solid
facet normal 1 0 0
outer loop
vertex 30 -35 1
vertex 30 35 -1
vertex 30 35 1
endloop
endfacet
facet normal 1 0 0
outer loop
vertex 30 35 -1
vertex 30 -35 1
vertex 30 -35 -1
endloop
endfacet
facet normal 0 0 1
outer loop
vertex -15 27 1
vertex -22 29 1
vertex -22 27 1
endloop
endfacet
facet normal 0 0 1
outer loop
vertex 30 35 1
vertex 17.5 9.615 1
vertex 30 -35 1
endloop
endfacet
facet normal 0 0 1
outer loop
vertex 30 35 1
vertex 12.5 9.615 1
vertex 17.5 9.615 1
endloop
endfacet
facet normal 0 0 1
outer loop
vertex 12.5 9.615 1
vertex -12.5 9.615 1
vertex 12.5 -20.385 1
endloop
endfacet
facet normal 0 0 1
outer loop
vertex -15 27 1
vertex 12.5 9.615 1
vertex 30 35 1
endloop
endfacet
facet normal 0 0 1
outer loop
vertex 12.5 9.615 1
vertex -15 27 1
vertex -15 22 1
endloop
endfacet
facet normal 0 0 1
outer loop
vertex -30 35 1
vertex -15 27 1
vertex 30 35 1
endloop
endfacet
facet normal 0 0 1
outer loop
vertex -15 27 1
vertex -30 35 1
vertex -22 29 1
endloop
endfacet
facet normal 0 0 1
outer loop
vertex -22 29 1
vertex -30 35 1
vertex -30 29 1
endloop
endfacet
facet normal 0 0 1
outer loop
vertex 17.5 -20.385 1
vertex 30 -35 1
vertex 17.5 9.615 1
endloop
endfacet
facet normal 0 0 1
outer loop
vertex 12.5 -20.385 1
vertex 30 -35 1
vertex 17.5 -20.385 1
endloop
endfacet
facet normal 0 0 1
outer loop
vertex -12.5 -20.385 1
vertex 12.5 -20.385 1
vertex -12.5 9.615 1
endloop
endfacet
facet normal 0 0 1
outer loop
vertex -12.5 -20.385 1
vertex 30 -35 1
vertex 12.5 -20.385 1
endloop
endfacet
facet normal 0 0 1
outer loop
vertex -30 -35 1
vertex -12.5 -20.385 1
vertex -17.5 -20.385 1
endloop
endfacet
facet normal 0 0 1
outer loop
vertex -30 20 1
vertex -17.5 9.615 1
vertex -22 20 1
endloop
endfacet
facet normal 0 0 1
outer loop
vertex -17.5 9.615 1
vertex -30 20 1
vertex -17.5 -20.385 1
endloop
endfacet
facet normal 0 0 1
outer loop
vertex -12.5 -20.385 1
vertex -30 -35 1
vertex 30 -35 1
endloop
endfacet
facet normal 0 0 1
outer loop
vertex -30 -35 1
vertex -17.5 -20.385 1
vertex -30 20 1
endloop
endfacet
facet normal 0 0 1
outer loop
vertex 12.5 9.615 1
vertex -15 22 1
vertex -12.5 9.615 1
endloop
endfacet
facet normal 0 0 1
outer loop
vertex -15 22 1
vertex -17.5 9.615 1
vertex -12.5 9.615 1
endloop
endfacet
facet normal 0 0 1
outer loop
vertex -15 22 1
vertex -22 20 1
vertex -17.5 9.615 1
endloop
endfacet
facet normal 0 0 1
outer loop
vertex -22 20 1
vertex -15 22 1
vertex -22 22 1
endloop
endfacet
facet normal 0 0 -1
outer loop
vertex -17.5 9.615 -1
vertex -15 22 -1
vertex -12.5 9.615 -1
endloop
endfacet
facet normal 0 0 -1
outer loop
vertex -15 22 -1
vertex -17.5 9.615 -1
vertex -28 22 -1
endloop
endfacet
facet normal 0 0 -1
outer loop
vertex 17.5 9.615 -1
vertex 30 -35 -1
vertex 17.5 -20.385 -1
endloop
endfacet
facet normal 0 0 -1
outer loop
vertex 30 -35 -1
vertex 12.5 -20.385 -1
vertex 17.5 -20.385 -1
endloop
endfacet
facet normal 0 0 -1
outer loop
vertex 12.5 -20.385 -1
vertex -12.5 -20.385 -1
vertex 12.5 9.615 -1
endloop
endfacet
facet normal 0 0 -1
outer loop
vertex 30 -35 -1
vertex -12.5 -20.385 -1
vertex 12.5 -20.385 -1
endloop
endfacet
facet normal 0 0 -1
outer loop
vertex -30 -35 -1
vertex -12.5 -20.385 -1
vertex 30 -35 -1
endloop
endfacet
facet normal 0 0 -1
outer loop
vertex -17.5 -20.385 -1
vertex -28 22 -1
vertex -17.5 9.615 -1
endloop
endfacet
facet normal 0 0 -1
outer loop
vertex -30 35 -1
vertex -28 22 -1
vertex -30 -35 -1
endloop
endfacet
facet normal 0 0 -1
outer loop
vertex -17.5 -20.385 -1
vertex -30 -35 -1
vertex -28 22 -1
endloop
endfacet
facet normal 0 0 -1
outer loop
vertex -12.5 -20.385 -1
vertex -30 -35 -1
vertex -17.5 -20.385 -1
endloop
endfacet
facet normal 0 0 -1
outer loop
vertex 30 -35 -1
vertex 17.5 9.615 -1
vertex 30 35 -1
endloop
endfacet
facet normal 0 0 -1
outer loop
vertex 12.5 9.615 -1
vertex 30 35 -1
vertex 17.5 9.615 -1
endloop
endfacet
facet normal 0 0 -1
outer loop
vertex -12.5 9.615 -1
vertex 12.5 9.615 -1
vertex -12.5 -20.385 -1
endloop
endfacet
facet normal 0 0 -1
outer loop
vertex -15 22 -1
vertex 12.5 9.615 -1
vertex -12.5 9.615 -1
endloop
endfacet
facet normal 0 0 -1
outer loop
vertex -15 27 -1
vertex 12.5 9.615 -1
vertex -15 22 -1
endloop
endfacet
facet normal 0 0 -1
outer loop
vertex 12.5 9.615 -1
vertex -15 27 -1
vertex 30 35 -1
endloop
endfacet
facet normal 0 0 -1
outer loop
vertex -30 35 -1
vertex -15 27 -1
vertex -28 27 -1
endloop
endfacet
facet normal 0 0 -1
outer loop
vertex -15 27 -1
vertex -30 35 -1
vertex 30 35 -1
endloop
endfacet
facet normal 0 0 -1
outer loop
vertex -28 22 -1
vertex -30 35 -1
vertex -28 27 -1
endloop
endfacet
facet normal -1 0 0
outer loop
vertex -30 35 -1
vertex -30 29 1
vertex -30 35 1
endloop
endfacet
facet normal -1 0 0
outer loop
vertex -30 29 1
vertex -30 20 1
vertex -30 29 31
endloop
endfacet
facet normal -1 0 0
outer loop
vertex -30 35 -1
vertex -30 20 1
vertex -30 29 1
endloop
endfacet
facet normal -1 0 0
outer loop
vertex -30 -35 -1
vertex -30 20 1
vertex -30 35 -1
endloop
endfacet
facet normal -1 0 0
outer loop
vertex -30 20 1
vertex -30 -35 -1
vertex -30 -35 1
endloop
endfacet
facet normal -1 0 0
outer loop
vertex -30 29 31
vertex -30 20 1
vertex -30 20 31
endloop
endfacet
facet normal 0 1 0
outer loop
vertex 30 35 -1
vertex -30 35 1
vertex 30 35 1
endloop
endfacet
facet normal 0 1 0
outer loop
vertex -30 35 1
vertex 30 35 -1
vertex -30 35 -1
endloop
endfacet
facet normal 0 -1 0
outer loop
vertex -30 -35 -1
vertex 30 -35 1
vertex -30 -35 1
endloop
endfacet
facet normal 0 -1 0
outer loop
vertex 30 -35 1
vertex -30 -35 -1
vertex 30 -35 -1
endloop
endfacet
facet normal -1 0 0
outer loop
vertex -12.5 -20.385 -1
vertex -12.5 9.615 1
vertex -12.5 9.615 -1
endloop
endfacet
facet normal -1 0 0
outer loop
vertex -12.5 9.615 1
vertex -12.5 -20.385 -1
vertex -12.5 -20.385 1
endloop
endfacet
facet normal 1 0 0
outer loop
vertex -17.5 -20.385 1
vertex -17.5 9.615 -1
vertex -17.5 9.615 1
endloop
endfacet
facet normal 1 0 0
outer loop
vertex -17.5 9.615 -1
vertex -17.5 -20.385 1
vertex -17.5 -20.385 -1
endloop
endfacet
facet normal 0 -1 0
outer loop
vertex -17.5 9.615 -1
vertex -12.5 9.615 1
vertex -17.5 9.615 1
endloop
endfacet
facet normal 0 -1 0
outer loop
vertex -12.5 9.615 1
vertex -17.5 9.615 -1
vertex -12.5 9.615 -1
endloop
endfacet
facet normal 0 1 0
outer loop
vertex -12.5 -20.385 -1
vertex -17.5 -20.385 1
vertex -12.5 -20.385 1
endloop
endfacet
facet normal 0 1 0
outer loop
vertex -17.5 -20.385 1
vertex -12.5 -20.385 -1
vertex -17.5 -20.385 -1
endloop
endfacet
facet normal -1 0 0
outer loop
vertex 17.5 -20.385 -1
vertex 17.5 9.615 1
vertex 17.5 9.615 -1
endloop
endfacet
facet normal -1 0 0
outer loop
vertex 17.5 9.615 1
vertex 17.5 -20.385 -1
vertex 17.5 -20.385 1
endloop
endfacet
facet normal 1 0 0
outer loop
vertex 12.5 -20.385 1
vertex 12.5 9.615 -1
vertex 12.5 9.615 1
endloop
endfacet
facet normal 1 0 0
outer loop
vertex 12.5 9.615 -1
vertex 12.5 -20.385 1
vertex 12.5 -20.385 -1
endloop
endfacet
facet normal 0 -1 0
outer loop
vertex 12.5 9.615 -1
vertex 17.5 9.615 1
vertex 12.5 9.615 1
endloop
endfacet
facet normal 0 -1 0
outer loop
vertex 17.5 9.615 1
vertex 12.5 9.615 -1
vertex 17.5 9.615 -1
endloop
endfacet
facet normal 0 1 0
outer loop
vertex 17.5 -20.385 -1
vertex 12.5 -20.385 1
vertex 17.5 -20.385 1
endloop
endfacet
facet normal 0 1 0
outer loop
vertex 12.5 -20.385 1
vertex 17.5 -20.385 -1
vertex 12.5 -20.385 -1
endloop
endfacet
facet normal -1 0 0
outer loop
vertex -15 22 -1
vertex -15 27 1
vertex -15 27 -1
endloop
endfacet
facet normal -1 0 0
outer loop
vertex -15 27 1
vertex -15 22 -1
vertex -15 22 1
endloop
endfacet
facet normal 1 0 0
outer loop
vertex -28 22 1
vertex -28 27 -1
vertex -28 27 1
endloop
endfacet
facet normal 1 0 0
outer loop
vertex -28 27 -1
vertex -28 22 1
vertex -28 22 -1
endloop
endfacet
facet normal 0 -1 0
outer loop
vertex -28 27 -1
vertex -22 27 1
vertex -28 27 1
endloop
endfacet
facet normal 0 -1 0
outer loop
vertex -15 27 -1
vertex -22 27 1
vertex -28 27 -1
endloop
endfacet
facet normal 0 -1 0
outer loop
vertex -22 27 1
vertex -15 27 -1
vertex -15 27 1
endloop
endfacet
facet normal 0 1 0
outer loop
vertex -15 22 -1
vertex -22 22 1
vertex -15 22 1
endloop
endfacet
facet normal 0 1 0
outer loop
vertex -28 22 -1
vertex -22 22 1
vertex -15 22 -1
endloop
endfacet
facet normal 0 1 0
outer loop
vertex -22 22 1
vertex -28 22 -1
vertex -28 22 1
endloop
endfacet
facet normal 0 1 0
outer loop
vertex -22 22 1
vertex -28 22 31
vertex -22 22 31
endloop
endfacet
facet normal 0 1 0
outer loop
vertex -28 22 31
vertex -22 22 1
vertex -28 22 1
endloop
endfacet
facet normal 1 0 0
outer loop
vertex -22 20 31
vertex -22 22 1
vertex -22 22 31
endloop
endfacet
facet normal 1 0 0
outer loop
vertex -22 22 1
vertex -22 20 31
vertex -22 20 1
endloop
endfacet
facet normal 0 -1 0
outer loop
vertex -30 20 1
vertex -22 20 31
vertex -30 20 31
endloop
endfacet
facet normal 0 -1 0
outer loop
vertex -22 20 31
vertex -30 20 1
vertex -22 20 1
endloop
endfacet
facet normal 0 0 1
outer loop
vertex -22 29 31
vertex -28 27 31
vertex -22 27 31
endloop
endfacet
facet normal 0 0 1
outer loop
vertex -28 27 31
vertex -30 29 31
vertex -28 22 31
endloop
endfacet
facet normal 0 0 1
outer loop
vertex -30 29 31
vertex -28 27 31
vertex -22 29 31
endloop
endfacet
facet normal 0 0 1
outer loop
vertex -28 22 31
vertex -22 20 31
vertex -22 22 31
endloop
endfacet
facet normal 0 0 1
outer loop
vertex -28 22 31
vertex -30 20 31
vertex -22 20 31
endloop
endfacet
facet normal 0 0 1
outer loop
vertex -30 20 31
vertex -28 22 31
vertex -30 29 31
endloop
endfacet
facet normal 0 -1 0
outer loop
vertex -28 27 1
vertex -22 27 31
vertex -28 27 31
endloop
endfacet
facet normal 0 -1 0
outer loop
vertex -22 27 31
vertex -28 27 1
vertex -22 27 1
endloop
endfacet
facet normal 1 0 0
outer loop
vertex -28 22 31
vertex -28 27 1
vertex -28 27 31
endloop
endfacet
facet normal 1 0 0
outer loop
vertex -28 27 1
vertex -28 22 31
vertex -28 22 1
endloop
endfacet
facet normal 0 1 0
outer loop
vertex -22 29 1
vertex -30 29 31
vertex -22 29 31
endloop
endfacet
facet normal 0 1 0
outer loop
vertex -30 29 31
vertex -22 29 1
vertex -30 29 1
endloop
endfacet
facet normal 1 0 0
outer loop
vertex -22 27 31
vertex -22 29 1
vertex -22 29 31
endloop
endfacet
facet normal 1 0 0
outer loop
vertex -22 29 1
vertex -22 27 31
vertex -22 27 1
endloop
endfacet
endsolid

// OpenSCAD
/* Rail Orientation*/
vertical = 1; //[1:Vertical,2:Horizontal]

/* Rack Rail */
rack_rail_height = 30;
rack_rail_width = 5;

rack_hole_height = 13;


/* Motor strap holes */
motor_hole_width = 5;
motor_hole_height = 30;

/* Base Plate size */
base_width = 60;
base_height = 70;


/*[Hidden]*/
rail_thickness=2;

//Holes
difference(){
    //base
    cube([base_width,base_height,2], center=true);
    
    //motor mount
    translate([-base_width/2+15,-base_height/13,0,])cube([motor_hole_width,motor_hole_height,10], center=true);
    translate([base_width/2-15,-base_height/13,0,])cube([motor_hole_width,motor_hole_height,10], center=true);
    
    //rack hole
    if (vertical == 1){
        translate([-base_width/2+rail_thickness,(base_height/2) -15 +rail_thickness,-5])cube([rack_hole_height, rack_rail_width, 10], center=false);
    }
};

//rail
module rack_rail(){
    
    
    if (vertical == 1){
        //vertical rail
        translate([-base_width/2, (base_height/2) -15,1])rotate([90,0,90])union(){
            cube([2,rack_rail_height,8], center=false);
            cube([2+rack_rail_width,rack_rail_height,2], center=false);
            translate([rail_thickness+rack_rail_width,0,0])cube([rail_thickness,rack_rail_height,8], center=false);
        };
    }
    else if (vertical == 2){
        //horizontal rail
        translate([rack_rail_height-(base_width/2), (base_height/2) -15,-1])rotate([0,0,90])union(){
            cube([2,rack_rail_height,8], center=false);
            cube([2+rack_rail_width,rack_rail_height,2], center=false);
            translate([rail_thickness+rack_rail_width,0,0])cube([rail_thickness,rack_rail_height,8], center=false);
        };
    }
};

rack_rail();
